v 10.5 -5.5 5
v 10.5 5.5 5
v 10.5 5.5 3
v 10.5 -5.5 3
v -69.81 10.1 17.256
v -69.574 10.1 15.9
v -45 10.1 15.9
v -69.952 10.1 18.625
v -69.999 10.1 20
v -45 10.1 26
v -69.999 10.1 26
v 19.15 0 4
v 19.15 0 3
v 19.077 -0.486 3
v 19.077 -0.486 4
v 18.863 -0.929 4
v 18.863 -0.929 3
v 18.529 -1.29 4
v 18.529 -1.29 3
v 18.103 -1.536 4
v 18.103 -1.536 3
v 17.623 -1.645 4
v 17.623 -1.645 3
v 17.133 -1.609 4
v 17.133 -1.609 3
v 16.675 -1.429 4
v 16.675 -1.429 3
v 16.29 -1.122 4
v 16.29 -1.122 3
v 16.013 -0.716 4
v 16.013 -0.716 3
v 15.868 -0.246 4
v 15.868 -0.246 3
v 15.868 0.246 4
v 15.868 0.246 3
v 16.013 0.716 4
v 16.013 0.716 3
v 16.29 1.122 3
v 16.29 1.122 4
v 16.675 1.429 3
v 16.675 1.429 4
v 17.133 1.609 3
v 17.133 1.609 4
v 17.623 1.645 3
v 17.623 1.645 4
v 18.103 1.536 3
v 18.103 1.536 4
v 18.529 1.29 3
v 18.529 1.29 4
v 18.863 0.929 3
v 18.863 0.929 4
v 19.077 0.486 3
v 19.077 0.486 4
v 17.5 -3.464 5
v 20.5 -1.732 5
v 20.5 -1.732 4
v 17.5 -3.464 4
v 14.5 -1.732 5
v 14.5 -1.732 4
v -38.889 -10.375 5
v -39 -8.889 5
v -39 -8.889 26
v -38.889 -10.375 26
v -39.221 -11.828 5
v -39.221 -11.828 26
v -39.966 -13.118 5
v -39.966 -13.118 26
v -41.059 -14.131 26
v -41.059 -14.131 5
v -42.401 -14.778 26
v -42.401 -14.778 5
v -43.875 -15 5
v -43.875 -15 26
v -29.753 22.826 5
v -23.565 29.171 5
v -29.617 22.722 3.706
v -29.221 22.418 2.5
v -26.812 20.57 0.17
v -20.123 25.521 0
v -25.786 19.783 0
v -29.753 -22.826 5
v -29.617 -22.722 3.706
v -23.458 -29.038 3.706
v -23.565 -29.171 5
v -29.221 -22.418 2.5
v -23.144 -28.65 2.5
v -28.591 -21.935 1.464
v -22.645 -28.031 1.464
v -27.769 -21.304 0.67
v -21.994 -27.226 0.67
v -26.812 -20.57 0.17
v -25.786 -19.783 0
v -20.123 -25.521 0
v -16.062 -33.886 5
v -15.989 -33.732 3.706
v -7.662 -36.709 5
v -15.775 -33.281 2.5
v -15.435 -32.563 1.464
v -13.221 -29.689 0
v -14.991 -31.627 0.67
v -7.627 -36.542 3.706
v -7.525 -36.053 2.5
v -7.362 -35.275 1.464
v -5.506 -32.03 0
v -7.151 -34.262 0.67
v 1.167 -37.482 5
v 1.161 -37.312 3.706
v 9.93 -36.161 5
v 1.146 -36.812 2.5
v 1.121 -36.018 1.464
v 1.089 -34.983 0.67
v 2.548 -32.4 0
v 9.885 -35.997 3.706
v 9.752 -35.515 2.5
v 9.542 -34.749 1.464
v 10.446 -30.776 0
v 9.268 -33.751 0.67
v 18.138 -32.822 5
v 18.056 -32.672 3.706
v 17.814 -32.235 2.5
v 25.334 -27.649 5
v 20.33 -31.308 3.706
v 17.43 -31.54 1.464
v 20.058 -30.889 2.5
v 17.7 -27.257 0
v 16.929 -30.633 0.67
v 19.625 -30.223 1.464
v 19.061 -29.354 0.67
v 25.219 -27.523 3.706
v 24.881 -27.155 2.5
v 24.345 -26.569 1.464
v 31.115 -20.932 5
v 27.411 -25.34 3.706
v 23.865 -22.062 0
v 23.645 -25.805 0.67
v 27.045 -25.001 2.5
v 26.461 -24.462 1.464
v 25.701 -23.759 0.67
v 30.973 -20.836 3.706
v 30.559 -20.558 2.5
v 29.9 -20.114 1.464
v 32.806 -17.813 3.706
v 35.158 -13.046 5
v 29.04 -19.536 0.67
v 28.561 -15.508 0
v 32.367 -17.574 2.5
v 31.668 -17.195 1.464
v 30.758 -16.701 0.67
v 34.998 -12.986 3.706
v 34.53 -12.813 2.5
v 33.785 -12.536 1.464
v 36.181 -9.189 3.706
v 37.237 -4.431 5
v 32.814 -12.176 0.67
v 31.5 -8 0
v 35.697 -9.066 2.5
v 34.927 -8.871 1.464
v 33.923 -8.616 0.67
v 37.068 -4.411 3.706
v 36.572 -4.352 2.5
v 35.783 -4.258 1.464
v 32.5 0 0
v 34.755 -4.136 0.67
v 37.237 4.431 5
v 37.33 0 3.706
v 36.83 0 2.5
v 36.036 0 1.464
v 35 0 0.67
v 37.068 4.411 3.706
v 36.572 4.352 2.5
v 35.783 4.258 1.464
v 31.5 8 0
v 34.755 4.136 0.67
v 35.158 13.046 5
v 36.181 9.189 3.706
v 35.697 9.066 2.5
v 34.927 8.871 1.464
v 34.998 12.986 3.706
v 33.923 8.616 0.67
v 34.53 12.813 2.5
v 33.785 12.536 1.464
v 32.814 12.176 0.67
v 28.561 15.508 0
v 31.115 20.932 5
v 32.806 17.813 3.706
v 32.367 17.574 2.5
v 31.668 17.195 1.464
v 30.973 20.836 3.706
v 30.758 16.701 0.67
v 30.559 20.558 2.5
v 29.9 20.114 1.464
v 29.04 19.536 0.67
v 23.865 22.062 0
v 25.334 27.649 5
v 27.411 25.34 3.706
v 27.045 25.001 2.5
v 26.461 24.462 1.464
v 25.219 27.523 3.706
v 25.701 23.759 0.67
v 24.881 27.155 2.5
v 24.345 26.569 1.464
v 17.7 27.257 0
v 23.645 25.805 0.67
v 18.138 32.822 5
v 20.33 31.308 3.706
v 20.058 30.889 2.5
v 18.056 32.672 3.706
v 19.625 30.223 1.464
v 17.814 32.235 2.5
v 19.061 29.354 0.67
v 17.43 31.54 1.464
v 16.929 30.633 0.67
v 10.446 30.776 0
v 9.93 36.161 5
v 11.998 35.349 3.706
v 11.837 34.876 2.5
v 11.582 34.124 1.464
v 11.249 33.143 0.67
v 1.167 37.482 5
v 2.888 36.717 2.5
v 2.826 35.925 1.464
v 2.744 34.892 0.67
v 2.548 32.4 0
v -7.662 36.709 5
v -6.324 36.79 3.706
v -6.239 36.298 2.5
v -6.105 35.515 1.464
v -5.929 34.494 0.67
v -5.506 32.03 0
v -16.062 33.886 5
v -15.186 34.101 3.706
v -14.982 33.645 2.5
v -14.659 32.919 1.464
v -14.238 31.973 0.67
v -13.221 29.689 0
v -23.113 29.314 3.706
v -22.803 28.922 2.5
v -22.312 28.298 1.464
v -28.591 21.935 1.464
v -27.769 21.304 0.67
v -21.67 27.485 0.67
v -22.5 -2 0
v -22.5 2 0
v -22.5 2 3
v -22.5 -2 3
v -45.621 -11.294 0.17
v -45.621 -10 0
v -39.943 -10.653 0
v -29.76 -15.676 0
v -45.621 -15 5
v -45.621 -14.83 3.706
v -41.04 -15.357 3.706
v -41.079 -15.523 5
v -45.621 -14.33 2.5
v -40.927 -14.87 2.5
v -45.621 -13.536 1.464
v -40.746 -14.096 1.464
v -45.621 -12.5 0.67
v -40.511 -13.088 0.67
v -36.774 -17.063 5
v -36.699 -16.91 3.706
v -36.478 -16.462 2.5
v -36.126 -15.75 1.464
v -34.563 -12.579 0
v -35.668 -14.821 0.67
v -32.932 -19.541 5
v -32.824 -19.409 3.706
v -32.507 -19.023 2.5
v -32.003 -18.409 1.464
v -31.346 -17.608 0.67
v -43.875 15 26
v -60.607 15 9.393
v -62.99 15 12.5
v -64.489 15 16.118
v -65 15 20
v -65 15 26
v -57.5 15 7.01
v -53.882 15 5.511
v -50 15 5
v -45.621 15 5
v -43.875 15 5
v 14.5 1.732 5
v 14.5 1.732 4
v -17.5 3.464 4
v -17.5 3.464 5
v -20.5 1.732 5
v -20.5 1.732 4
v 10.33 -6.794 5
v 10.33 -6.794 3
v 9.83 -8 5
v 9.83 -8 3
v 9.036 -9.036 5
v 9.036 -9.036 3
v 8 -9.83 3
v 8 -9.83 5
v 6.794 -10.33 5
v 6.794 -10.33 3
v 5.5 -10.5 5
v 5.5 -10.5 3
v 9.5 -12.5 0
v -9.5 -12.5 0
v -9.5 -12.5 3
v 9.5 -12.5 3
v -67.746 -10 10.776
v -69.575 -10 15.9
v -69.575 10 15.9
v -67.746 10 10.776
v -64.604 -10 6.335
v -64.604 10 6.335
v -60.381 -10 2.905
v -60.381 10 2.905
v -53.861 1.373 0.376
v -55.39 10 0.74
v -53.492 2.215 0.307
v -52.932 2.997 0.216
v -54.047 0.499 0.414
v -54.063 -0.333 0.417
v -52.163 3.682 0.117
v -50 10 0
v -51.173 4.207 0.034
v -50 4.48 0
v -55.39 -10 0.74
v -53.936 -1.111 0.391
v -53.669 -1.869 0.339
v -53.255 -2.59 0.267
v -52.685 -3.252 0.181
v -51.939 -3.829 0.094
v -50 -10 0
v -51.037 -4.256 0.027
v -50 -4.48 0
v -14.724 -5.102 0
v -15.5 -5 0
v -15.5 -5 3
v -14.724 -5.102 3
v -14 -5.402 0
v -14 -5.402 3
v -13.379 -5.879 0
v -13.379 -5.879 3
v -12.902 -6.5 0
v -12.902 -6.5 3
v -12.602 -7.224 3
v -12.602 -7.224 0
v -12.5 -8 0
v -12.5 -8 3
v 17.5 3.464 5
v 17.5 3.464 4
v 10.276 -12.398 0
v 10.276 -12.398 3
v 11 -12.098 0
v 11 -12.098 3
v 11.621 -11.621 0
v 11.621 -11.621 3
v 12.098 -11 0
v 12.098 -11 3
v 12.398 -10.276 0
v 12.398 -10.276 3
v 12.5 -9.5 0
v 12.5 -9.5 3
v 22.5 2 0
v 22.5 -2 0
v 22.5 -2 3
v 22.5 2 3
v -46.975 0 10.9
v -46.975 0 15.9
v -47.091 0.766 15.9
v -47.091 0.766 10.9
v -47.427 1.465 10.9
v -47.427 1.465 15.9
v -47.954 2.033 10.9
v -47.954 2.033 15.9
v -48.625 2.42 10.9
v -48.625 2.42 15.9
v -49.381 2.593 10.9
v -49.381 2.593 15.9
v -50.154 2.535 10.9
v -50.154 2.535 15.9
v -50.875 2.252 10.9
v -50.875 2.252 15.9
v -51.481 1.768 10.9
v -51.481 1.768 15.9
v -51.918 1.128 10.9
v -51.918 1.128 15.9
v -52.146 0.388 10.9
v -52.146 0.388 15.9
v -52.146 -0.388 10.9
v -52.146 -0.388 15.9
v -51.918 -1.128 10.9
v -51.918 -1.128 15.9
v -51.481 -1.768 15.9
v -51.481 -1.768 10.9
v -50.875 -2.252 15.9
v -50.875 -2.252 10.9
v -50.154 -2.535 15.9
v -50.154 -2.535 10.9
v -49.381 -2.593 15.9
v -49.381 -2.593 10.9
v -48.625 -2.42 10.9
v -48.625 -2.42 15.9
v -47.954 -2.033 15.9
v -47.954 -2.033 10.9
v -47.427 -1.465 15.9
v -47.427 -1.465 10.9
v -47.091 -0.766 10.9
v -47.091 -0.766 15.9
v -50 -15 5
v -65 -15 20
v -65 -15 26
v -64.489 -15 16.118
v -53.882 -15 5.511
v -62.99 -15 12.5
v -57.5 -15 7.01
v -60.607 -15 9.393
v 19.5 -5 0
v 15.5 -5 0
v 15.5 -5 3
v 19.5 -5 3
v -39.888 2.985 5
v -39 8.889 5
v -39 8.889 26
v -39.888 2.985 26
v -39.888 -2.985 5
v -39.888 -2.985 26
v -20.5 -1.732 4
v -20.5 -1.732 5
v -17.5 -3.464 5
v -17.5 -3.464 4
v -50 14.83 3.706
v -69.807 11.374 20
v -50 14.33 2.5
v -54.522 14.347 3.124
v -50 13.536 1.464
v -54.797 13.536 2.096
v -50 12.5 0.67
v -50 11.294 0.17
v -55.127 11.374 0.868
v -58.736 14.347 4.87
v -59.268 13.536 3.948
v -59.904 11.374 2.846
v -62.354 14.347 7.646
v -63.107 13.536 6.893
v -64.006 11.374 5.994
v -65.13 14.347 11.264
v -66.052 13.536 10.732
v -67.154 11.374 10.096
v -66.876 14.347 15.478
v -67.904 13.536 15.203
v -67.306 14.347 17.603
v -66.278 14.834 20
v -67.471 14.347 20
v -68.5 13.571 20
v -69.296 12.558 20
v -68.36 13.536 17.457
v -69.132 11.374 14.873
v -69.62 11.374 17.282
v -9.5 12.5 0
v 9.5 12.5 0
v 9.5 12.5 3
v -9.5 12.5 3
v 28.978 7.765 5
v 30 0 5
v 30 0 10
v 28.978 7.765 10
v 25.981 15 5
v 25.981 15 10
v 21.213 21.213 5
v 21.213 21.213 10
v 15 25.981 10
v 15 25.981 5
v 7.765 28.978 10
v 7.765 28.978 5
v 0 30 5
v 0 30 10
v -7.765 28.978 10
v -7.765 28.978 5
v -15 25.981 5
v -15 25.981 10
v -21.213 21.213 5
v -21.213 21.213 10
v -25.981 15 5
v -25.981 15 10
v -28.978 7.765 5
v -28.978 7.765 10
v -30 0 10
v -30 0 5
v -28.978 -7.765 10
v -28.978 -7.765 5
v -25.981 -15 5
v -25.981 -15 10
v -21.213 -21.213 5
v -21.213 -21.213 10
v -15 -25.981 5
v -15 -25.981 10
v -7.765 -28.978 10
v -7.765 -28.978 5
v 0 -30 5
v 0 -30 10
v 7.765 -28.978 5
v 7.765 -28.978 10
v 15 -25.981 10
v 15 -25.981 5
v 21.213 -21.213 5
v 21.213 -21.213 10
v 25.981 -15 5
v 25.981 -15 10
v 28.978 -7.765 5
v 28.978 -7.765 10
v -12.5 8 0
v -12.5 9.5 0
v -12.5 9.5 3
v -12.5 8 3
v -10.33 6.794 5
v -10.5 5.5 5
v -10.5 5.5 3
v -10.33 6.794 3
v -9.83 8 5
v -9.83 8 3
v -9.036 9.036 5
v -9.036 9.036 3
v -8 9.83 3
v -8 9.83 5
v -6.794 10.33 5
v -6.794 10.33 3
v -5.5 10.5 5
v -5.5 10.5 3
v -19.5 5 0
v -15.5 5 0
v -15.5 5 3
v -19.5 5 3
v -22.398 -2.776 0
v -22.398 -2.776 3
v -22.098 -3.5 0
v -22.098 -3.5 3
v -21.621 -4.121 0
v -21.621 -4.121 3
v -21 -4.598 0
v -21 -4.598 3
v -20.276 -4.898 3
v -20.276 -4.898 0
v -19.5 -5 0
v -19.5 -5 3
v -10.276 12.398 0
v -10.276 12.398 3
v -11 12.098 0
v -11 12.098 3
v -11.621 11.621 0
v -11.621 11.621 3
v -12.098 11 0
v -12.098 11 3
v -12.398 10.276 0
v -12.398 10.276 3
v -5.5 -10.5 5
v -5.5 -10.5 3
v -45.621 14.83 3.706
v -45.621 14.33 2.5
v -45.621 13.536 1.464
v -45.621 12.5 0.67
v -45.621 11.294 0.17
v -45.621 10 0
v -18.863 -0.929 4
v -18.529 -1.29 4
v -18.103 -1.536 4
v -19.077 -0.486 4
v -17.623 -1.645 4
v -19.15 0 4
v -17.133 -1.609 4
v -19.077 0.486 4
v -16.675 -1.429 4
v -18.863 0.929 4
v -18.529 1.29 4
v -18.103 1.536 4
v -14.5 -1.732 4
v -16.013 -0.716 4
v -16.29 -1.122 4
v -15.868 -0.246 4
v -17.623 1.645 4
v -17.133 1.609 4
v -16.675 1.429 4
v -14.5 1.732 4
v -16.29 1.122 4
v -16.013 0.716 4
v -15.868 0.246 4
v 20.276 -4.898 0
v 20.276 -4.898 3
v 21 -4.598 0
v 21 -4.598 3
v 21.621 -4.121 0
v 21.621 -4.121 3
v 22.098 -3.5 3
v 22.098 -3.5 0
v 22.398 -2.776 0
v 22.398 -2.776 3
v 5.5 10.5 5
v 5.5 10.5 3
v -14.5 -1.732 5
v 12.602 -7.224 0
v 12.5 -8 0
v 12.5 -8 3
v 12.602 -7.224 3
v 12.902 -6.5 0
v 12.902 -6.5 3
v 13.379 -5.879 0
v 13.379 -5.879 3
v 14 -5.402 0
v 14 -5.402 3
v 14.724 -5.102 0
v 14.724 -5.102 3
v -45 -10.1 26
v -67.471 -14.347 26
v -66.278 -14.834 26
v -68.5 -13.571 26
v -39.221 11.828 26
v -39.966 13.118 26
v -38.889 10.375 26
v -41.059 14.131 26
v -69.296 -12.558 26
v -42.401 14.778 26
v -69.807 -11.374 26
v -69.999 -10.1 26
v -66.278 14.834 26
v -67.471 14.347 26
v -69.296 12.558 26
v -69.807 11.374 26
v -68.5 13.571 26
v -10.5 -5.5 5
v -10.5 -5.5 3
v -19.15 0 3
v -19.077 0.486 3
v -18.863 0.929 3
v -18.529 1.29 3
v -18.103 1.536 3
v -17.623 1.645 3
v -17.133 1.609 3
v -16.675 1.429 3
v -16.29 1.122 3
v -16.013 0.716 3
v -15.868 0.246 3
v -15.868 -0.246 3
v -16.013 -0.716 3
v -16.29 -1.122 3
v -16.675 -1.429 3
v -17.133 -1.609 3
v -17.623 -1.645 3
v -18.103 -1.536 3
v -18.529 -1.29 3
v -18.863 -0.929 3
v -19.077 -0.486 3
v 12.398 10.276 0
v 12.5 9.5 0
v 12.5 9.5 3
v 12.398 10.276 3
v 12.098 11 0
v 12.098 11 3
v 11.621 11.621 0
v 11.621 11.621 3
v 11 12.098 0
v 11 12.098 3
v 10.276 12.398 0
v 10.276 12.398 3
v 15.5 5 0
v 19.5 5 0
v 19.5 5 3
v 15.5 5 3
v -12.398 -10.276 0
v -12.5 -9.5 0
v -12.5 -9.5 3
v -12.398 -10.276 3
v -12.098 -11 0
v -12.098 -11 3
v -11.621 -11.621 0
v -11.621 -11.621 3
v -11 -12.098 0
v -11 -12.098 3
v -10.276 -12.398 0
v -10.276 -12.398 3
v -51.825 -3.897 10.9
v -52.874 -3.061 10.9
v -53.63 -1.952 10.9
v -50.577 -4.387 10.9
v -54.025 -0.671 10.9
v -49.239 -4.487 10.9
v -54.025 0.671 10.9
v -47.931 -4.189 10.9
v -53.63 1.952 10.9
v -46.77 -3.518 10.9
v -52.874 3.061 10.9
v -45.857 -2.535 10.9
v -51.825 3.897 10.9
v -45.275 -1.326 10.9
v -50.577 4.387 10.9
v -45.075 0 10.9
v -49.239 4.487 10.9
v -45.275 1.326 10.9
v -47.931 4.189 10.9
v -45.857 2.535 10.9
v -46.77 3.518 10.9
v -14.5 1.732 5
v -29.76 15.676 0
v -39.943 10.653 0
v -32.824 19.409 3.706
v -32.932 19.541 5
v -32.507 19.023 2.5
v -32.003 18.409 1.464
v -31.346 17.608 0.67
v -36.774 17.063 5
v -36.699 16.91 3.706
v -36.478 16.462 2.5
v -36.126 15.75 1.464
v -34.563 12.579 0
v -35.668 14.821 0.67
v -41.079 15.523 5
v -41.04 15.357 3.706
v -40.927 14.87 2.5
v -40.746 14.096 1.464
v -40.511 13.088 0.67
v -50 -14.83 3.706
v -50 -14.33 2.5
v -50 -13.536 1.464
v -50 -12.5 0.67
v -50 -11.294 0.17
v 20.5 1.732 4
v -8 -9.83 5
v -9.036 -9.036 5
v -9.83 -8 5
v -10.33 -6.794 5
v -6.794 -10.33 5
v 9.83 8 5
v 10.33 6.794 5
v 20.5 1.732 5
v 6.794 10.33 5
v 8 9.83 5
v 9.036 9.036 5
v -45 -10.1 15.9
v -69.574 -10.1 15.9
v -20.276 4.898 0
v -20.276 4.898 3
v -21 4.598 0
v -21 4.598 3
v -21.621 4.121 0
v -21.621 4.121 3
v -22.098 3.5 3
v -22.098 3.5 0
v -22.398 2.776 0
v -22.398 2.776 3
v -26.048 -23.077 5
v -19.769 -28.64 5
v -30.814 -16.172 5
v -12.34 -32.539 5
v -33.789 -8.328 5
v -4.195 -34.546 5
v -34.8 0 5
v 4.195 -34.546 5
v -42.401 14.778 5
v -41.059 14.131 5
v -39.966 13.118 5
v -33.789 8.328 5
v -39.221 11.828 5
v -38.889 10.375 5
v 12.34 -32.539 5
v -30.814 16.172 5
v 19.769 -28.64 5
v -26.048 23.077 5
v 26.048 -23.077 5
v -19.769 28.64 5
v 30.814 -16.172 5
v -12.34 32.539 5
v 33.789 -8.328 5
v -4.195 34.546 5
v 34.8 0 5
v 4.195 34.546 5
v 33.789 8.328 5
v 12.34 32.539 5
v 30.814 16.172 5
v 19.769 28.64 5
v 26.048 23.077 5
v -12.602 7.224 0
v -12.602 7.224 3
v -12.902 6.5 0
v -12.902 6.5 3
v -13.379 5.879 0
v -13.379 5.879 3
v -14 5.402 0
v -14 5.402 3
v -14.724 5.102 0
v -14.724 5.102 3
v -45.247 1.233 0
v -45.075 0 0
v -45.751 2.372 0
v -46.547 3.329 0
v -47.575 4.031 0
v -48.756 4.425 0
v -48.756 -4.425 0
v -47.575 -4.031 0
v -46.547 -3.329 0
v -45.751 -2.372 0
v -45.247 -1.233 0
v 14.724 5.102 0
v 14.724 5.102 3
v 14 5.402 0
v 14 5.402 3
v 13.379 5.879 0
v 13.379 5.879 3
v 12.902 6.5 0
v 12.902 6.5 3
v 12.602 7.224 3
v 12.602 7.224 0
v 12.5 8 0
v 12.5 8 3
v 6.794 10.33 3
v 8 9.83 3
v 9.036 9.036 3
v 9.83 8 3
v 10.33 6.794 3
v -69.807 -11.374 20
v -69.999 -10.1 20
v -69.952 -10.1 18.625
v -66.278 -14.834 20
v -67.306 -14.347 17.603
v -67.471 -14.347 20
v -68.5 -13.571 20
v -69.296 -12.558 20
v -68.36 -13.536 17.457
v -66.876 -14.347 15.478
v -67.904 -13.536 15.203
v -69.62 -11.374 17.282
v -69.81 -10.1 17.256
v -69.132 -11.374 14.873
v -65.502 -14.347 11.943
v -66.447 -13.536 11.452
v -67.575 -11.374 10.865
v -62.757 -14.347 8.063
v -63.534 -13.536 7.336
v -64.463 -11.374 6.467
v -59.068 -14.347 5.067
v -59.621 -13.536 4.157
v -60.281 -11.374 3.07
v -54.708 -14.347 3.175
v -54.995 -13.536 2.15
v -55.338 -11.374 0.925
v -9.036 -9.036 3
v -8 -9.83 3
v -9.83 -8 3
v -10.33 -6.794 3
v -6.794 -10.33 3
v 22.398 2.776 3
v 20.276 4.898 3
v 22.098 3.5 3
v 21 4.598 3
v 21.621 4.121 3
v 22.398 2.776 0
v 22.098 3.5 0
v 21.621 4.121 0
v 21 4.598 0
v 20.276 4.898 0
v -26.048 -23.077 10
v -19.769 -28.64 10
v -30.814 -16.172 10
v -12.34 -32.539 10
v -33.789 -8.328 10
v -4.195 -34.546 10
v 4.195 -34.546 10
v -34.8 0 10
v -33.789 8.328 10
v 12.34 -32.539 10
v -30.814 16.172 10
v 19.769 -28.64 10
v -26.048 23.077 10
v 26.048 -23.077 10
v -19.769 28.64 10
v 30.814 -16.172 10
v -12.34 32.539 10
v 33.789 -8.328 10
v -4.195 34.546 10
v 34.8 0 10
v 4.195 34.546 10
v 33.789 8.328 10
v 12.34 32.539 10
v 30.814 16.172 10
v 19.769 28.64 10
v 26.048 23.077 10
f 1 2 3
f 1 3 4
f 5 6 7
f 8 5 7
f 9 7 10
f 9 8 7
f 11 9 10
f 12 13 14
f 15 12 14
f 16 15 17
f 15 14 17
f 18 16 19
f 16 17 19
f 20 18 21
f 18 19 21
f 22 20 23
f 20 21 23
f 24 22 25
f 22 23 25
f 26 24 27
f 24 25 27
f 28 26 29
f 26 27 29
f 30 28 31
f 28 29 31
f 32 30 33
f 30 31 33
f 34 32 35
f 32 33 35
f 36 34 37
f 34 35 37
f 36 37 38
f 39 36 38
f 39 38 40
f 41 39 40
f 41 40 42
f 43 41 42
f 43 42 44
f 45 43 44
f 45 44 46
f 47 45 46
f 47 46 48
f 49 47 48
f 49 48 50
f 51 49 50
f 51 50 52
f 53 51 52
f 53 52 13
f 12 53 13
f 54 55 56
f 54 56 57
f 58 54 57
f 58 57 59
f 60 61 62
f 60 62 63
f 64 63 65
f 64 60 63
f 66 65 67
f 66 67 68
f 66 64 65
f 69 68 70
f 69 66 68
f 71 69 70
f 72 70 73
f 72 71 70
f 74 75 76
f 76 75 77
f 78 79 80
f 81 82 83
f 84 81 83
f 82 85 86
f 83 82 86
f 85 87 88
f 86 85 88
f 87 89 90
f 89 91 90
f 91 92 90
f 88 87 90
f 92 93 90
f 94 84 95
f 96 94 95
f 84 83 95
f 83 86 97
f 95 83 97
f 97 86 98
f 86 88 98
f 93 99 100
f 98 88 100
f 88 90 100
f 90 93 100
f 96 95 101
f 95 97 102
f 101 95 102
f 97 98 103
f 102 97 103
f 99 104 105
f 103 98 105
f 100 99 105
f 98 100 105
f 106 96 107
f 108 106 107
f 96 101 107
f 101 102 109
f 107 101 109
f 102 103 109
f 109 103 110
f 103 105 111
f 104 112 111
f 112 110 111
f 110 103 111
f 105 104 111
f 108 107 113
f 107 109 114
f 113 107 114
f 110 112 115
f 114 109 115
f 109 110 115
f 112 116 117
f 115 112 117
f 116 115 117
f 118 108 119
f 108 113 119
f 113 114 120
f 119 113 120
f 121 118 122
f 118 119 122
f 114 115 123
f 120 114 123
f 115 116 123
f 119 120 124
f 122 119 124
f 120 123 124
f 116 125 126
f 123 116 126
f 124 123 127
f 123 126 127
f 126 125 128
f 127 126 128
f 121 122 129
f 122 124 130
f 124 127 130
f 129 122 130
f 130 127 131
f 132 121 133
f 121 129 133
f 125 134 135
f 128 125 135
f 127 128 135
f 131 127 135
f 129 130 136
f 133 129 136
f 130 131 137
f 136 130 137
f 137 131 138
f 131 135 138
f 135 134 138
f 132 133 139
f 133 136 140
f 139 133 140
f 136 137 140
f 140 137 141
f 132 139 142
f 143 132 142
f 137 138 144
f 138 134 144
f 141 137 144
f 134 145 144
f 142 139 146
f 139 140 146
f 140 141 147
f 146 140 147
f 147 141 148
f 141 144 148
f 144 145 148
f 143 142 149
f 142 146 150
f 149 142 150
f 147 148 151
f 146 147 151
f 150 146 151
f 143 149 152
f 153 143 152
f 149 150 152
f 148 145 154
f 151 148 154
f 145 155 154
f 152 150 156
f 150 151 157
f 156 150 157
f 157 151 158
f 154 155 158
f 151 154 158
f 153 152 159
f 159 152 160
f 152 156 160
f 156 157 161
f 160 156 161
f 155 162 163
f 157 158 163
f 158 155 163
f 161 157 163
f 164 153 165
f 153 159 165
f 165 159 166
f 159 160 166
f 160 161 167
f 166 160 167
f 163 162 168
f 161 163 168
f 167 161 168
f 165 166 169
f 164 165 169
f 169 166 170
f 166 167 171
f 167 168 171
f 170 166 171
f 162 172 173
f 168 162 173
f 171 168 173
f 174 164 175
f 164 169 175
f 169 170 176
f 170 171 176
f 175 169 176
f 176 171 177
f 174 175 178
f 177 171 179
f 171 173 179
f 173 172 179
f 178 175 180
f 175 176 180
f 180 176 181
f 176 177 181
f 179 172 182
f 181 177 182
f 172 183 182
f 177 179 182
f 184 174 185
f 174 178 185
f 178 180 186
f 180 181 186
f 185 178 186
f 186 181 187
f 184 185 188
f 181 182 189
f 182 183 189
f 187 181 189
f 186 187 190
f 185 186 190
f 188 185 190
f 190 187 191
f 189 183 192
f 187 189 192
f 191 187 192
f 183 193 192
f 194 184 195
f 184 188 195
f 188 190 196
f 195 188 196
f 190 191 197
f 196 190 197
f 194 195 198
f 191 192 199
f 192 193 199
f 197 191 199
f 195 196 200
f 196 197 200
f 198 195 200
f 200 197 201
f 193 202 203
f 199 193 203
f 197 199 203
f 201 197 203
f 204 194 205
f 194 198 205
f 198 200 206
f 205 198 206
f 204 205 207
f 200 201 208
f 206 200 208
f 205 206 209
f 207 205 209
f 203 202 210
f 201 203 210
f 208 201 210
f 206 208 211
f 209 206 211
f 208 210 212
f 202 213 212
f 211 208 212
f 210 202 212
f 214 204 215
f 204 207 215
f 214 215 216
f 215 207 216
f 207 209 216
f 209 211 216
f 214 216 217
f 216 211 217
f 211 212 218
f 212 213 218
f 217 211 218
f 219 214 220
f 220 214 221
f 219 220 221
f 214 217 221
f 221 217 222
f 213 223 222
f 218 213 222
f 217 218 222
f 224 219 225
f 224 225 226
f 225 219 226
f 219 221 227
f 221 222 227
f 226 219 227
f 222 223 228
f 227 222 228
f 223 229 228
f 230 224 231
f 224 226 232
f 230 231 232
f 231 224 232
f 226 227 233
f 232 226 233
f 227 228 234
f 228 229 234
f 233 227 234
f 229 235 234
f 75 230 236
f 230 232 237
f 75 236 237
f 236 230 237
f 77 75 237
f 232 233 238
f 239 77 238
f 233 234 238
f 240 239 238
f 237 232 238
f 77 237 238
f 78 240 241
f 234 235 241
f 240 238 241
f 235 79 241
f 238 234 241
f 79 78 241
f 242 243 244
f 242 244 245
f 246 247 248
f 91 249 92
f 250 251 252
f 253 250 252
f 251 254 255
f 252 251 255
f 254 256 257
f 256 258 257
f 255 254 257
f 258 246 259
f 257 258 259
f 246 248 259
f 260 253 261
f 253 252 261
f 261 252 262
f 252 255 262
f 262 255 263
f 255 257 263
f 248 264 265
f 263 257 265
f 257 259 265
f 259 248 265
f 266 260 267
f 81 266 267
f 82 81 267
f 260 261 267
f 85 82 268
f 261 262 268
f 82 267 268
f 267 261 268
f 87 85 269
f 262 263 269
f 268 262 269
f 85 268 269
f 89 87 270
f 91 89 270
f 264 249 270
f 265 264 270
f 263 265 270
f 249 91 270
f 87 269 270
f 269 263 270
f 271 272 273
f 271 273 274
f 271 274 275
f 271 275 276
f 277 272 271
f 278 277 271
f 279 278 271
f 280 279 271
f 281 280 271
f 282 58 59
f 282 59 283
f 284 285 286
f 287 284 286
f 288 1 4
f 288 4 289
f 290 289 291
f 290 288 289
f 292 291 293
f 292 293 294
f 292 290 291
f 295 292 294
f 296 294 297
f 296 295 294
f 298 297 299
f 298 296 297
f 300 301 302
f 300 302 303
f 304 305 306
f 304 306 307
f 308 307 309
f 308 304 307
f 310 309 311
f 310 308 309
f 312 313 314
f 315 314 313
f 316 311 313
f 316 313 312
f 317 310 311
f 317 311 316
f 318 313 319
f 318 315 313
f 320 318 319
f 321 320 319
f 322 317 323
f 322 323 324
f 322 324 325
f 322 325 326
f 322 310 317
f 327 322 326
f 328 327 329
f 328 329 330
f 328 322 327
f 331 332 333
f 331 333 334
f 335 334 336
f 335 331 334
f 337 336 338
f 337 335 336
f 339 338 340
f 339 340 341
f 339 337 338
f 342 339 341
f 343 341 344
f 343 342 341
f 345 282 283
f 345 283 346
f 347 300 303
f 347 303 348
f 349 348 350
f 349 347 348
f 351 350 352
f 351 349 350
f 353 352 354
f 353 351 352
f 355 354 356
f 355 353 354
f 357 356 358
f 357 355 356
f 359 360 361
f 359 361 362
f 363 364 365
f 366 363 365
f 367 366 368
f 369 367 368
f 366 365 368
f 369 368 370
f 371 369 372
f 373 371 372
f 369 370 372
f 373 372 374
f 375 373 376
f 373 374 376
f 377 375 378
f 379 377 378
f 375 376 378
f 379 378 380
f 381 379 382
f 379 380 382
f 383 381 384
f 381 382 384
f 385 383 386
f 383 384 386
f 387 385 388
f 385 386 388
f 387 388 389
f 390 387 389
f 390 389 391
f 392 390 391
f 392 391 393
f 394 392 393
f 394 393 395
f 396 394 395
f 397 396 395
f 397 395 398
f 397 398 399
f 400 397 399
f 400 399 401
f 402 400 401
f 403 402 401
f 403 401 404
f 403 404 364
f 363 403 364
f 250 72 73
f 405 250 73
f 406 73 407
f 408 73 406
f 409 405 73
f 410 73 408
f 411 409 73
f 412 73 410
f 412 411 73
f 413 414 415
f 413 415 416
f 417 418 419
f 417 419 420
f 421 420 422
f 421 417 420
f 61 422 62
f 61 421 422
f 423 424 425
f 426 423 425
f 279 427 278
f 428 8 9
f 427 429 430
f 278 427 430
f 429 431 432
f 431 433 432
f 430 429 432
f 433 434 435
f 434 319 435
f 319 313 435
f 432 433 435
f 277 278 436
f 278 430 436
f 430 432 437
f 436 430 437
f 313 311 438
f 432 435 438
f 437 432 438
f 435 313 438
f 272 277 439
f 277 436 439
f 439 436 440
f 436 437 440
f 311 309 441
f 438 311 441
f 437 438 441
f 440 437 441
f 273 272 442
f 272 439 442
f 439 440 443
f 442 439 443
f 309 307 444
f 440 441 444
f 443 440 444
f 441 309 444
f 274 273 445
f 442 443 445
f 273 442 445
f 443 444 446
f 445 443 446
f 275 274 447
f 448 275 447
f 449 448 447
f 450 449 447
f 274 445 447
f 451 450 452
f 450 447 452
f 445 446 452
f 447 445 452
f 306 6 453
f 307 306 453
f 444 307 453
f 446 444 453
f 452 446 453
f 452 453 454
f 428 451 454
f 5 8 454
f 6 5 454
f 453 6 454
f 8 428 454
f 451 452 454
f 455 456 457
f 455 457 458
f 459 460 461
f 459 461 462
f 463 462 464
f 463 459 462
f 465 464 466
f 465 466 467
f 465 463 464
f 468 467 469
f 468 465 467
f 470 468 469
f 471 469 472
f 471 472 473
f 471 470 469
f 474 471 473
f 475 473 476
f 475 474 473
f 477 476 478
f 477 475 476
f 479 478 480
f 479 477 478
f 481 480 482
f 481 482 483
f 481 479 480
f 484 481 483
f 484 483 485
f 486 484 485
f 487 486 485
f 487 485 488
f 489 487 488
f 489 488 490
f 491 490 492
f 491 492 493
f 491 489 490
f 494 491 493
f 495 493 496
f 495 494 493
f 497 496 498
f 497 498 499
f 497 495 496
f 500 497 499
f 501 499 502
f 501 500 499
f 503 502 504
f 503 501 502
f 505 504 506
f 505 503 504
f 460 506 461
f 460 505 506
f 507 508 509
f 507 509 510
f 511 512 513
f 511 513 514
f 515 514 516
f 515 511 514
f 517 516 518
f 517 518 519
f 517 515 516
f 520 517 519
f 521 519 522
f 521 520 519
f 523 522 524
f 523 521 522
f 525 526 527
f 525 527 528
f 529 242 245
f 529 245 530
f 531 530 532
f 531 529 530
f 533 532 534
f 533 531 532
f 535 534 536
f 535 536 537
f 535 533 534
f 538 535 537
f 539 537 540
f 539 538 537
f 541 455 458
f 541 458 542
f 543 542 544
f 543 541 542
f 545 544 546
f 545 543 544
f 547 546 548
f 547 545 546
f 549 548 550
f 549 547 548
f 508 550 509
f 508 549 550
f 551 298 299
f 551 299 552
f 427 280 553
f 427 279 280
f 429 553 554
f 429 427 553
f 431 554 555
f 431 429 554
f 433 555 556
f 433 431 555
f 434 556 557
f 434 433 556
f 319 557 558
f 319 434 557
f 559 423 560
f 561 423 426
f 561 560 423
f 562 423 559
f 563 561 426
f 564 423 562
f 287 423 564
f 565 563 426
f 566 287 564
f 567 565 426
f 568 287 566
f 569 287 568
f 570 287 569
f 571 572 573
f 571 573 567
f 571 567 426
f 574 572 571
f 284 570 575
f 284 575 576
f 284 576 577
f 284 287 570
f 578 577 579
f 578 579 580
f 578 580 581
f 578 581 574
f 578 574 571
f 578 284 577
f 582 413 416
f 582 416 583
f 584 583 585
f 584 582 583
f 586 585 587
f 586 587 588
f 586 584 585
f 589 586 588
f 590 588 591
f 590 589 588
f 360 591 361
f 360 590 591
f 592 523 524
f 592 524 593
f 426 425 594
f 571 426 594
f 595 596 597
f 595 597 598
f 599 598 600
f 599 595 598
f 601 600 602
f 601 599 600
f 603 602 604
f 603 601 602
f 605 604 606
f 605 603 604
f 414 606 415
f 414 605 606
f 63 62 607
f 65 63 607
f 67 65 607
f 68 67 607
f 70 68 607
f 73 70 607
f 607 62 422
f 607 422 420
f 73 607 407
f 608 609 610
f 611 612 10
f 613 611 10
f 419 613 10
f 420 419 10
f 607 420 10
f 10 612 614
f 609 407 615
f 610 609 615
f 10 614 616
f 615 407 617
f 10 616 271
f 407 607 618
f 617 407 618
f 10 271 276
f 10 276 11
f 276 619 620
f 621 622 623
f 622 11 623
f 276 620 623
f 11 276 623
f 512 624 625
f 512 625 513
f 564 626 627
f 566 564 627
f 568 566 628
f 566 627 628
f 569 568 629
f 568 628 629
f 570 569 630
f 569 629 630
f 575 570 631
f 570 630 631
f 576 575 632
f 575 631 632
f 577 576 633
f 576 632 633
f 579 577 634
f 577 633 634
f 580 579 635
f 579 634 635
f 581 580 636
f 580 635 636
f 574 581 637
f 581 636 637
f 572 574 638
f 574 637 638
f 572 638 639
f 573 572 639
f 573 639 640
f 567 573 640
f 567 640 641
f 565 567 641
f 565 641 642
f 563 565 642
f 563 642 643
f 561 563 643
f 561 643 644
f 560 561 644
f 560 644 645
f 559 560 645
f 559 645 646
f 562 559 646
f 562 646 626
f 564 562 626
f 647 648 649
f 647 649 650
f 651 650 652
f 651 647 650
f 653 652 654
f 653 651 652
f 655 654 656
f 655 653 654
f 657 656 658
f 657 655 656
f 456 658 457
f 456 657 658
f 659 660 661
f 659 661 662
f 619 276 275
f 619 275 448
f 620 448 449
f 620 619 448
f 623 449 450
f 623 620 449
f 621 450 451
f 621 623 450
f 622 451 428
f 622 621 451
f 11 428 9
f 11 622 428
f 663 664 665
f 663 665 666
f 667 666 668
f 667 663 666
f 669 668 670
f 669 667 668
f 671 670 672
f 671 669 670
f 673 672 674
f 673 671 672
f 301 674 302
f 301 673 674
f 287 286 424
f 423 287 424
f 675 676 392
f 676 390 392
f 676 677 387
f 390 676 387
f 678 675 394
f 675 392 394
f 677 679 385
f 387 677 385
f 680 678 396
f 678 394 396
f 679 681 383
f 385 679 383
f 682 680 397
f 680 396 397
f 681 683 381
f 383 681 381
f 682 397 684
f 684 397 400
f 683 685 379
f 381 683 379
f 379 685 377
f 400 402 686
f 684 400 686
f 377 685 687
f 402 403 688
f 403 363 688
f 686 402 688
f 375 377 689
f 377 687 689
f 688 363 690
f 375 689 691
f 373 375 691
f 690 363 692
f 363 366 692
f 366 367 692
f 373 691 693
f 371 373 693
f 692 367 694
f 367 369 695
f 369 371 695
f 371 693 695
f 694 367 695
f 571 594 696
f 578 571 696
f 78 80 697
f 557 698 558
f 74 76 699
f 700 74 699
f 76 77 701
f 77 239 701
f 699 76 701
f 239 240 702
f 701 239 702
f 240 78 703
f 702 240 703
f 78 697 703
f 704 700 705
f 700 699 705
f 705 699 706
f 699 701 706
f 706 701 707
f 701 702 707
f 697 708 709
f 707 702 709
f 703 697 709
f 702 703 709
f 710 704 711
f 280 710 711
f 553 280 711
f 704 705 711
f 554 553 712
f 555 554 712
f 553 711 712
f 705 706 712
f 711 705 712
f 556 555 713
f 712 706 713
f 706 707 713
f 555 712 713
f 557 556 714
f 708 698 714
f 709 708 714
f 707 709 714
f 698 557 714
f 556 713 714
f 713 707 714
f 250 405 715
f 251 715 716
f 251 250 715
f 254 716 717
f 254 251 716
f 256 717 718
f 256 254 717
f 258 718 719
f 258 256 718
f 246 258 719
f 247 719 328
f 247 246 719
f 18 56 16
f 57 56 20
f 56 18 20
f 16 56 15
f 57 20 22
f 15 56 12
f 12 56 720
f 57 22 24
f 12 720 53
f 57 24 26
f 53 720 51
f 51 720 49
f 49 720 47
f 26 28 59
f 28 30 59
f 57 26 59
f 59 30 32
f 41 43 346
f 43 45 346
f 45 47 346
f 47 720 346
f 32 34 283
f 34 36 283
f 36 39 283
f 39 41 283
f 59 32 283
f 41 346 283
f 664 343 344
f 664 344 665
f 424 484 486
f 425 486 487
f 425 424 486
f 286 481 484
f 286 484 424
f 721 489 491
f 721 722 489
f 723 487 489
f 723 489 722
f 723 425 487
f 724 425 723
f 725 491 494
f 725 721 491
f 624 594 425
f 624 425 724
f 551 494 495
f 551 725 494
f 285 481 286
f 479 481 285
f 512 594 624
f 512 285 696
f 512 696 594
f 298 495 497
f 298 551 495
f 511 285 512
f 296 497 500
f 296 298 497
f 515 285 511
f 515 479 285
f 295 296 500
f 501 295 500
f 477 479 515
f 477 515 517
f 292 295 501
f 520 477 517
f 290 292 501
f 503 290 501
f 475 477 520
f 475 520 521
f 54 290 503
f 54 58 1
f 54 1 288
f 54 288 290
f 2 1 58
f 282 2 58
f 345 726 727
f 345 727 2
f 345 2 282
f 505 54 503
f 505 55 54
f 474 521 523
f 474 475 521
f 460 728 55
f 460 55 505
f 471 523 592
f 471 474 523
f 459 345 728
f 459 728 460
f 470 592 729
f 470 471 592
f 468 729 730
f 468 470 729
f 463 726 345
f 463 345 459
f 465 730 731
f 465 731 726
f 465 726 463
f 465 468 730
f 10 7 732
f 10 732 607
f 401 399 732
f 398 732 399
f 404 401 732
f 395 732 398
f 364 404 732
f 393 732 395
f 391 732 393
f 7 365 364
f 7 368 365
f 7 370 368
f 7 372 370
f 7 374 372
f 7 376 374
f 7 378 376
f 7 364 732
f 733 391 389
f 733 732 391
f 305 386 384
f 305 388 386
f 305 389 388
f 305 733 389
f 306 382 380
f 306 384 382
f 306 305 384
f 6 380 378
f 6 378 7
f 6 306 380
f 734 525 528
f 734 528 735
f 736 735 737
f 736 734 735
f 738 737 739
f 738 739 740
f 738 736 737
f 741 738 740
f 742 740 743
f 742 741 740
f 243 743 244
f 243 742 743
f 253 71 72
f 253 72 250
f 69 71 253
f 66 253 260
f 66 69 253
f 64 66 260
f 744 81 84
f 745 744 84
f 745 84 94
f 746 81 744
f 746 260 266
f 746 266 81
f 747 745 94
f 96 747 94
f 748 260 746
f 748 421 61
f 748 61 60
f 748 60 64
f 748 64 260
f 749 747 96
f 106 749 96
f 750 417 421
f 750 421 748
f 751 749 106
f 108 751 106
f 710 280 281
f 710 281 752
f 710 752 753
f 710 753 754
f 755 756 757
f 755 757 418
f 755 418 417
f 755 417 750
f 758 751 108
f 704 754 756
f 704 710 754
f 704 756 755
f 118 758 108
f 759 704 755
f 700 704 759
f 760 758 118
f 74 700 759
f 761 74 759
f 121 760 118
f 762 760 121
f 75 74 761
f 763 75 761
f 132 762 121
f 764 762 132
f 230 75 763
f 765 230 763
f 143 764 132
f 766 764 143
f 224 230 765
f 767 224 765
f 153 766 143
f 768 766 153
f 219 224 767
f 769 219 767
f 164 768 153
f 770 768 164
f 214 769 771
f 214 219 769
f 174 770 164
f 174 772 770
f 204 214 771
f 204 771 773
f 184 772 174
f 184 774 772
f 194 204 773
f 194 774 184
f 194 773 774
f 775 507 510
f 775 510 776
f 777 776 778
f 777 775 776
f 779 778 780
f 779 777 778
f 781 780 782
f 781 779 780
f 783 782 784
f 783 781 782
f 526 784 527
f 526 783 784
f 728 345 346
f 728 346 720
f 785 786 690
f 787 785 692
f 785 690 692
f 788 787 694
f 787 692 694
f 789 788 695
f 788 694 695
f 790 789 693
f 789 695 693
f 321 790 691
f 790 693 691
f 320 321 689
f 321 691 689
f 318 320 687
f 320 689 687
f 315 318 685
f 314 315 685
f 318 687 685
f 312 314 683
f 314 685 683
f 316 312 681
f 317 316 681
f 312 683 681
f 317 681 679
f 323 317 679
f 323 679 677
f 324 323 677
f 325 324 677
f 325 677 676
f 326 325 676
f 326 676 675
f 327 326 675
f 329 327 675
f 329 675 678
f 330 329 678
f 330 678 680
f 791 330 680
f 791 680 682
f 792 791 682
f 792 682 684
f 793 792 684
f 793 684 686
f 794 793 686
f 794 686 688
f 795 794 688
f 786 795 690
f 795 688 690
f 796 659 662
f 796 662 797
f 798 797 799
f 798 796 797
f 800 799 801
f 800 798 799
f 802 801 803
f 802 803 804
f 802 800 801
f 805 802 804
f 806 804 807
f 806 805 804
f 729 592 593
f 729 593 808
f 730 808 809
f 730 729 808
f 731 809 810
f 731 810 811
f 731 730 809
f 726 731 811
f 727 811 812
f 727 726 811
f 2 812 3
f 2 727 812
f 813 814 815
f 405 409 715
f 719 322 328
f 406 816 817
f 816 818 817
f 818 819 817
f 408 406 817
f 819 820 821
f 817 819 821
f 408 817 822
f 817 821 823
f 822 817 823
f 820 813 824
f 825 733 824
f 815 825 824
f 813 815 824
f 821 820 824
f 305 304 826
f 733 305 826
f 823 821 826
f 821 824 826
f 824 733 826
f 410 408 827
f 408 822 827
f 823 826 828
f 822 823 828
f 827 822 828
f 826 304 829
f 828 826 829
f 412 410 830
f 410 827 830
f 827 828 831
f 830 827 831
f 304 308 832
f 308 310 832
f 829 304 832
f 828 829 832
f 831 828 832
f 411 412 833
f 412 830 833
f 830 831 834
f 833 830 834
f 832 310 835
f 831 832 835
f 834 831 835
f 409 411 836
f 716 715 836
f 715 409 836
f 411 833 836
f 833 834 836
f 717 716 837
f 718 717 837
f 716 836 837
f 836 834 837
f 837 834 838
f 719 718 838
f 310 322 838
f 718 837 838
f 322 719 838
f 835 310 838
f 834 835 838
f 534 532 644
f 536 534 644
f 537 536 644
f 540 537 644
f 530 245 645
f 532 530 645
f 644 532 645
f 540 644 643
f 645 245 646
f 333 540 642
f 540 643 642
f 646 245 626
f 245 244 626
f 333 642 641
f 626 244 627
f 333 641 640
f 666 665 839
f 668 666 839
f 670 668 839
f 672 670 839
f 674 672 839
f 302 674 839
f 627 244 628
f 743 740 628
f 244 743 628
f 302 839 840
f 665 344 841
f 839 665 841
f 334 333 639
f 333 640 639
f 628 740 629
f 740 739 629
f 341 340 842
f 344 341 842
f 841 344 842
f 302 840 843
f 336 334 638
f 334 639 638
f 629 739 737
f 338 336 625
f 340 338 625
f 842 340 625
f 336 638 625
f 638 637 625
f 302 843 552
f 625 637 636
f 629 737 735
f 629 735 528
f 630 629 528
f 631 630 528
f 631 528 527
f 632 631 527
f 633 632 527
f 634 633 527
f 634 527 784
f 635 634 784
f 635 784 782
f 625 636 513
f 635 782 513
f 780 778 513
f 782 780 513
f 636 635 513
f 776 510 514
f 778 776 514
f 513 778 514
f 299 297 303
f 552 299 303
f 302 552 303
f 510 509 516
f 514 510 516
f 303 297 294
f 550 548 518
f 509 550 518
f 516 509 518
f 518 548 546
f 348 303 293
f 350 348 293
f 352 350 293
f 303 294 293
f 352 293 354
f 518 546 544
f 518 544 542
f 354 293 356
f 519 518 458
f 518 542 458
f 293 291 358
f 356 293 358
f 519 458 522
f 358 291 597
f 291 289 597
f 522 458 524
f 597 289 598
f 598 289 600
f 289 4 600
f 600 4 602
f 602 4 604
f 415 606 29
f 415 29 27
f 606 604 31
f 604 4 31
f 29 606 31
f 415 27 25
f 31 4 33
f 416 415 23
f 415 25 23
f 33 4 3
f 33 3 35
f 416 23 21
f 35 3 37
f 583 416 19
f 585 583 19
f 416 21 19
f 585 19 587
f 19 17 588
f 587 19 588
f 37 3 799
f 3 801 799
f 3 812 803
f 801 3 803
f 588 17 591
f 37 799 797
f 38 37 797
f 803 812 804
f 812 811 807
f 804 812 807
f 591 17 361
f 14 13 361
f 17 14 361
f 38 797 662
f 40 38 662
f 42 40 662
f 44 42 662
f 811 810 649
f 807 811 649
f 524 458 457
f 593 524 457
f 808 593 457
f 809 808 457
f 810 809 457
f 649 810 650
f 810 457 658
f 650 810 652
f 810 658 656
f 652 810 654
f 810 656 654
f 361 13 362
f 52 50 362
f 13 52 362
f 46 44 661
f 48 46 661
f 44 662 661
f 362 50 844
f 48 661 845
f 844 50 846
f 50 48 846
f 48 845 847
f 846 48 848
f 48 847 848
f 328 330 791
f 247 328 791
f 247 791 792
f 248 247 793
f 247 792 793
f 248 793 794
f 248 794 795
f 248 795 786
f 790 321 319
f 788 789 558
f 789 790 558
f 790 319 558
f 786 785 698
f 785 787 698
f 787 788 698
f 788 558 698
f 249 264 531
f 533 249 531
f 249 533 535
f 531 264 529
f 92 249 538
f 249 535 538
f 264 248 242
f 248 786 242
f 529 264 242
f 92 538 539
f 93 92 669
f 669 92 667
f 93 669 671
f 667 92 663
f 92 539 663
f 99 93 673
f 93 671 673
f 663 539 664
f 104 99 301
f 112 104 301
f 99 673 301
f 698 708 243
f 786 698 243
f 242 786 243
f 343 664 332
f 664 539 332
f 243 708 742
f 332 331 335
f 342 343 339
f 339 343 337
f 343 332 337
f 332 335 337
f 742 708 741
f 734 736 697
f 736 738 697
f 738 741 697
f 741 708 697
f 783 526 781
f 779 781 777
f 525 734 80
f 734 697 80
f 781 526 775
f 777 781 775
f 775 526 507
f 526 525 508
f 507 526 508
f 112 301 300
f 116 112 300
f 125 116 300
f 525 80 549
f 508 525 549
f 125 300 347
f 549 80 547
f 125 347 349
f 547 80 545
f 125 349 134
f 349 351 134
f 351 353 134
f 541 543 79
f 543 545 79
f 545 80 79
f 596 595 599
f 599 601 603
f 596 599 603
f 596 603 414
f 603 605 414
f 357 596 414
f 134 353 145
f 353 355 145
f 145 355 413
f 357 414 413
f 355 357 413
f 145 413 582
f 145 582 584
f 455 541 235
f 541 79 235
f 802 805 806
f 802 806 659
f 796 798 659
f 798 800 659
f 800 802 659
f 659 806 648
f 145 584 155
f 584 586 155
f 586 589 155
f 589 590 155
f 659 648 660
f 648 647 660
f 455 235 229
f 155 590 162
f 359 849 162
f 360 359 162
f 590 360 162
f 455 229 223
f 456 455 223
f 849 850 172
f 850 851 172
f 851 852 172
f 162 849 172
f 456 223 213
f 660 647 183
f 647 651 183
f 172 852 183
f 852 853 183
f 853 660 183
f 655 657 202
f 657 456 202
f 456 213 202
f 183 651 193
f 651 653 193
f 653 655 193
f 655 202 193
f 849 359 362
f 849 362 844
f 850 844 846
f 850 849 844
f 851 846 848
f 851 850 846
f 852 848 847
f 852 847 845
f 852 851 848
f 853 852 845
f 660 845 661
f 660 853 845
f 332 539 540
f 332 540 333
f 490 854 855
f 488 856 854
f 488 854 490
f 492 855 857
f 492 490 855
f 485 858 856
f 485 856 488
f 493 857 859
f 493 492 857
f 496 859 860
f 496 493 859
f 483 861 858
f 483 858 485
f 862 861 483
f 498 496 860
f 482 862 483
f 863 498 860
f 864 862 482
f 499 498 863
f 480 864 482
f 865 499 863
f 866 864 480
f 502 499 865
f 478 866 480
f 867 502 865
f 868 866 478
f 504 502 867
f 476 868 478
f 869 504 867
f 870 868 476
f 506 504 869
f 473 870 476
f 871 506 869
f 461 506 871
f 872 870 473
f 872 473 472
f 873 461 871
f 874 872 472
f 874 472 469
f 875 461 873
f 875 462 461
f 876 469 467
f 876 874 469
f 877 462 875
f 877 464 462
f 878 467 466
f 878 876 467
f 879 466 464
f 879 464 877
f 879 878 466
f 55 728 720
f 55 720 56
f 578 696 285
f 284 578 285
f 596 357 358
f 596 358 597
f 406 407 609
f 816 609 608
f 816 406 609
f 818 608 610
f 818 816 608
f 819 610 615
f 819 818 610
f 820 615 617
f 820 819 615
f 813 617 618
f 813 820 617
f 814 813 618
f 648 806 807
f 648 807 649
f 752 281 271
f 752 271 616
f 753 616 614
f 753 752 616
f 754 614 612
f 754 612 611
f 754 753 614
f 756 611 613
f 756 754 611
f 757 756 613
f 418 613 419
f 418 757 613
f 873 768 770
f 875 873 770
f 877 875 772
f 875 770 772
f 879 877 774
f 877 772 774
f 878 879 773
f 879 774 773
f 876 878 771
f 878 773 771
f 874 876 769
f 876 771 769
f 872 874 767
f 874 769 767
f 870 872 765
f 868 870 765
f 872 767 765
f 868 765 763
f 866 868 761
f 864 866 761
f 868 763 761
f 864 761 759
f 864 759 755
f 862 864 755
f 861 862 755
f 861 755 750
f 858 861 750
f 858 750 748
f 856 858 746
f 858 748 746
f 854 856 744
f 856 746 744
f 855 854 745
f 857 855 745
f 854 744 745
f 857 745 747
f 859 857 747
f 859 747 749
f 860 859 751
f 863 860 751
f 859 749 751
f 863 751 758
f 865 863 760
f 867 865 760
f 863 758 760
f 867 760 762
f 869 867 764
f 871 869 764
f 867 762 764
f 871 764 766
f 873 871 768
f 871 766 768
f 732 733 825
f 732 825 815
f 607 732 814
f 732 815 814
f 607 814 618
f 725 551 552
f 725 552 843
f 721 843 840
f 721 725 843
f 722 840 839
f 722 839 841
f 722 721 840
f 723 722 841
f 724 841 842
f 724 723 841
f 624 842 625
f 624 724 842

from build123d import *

# Parameters (mm, degrees)
BOSS_EXTRU_1_DEPTH      = 5
ESQUISSE6_R             = 34.8
ESQUISSE6_R_2           = 30
BOSS_EXTRU_6_DEPTH      = 5
BOSS_EXTRU_9_DEPTH      = 21
CONG_1_R                = 20
CONG_2_R                = 5
ESQUISSE11_W            = 20.2
ESQUISSE11_H            = 20.2
ENL_V_MAT_EXTRU_2_DEPTH = 25
ESQUISSE12_R            = 2.6
ENL_V_MAT_EXTRU_3_DEPTH = 81.987161213
ENL_V_START             = -5
ESQUISSE13_R            = 4.5
ENL_V_MAT_EXTRU_4_DEPTH = 76.987161213
ENL_V_MAT_EXTRU_5_DEPTH = 2
ENL_V_MAT_EXTRU_7_DEPTH = 3
ESQUISSE19_R            = 1.65
ENL_V_MAT_EXTRU_8_DEPTH = 83.674725752
ENL_V_MAT_EXTRU_9_DEPTH = 1


with BuildPart() as part:
    # Esquisse1 → Boss.-Extru.1 (new body)
    with BuildSketch(Plane.XY):
        with BuildLine():
            Line((-45.620718977, 15), (-70, 15))
            Line((-70, 15), (-70, -15))
            Line((-70, -15), (-45.620718977, -15))
            ThreePointArc((-45.620718977, -15), (-36.774201608, -17.062911874), (-29.752642811, -22.826086957))
            ThreePointArc((-29.752642811, -22.826086957), (37.5, 0), (-29.752642811, 22.826086957))
            ThreePointArc((-29.752642811, 22.826086957), (-36.774201608, 17.062911874), (-45.620718977, 15))
        make_face()
    extrude(amount=BOSS_EXTRU_1_DEPTH)

    # Esquisse6 → Boss.-Extru.6 (add)
    with BuildSketch(Plane.XY.offset(5)):
        Circle(ESQUISSE6_R)
        Circle(ESQUISSE6_R_2, mode=Mode.SUBTRACT)
    extrude(amount=BOSS_EXTRU_6_DEPTH)

    # Esquisse8 → Boss.-Extru.9 (add)
    with BuildSketch(Plane.XY.offset(5)):
        with BuildLine():
            Line((-70, -15), (-70, 15))
            Line((-70, 15), (-43.874821937, 15))
            ThreePointArc((-43.874821937, 15), (-39.966142137, 13.118047822), (-38.999841722, 8.888888889))
            ThreePointArc((-38.999841722, 8.888888889), (-40, 0), (-38.999841722, -8.888888889))
            ThreePointArc((-38.999841722, -8.888888889), (-39.966142137, -13.118047822), (-43.874821937, -15))
            Line((-43.874821937, -15), (-70, -15))
        make_face()
    extrude(amount=BOSS_EXTRU_9_DEPTH)

    # Congé1
    cong_1_edges = [part.edges().sort_by_distance(p)[0] for p in [
        (-70, 0, 0),
    ]]
    fillet(cong_1_edges, radius=CONG_1_R)

    # Congé2
    cong_2_edges = [part.edges().sort_by_distance(p)[0] for p in [
        (-47.810359489, -15, 0),
        (-36.774201608, -17.062911874, 0),
        (37.5, 0, 0),
        (-36.774201608, 17.062911874, 0),
        (-47.810359489, 15, 0),
        (-64.142135624, 15, 5.857864376),
        (-64.142135624, -15, 5.857864376),
        (-70, -15, 23),
        (-70, 15, 23),
    ]]
    fillet(cong_2_edges, radius=CONG_2_R - 0.0001)  # a hair under: the kernel refuses the full size

    # Esquisse11 → Enlèv. mat.-Extru.2 (cut)
    with BuildSketch(Plane.ZY.offset(70)):
        with Locations((26, 0)):
            Rectangle(ESQUISSE11_W, ESQUISSE11_H)
    extrude(amount=-ENL_V_MAT_EXTRU_2_DEPTH, mode=Mode.SUBTRACT)

    # Esquisse12 → Enlèv. mat.-Extru.3 (cut, through all)
    with BuildSketch(Plane.XY.offset(15.9)):
        with Locations((-49.575239462, 0)):
            Circle(ESQUISSE12_R)
    extrude(amount=-ENL_V_MAT_EXTRU_3_DEPTH, mode=Mode.SUBTRACT)

    # Esquisse13 → Enlèv. mat.-Extru.4 (cut, through all)
    with BuildSketch(Plane.XY.offset(15.9).offset(ENL_V_START)):
        with Locations((-49.575239462, 0)):
            Circle(ESQUISSE13_R)
    extrude(amount=-ENL_V_MAT_EXTRU_4_DEPTH, mode=Mode.SUBTRACT)

    # Esquisse14 → Enlèv. mat.-Extru.5 (cut)
    with BuildSketch(Plane.XY.offset(5)):
        with BuildLine():
            Line((-5.5, 10.5), (5.5, 10.5))
            ThreePointArc((5.5, 10.5), (9.035533906, 9.035533906), (10.5, 5.5))
            Line((10.5, 5.5), (10.5, -5.5))
            ThreePointArc((10.5, -5.5), (9.035533906, -9.035533906), (5.5, -10.5))
            Line((5.5, -10.5), (-5.5, -10.5))
            ThreePointArc((-5.5, -10.5), (-9.035533906, -9.035533906), (-10.5, -5.5))
            Line((-10.5, -5.5), (-10.5, 5.5))
            ThreePointArc((-10.5, 5.5), (-9.035533906, 9.035533906), (-5.5, 10.5))
        make_face()
    extrude(amount=-ENL_V_MAT_EXTRU_5_DEPTH, mode=Mode.SUBTRACT)

    # Esquisse17 → Enlèv. mat.-Extru.7 (cut)
    with BuildSketch(Plane(origin=(0, 0, 0), x_dir=(-1, 0, 0), z_dir=(0, 0, -1))):
        with BuildLine():
            Line((15.5, 5), (19.5, 5))
            ThreePointArc((19.5, 5), (21.621320344, 4.121320344), (22.5, 2))
            Line((22.5, 2), (22.5, -2))
            ThreePointArc((22.5, -2), (21.621320344, -4.121320344), (19.5, -5))
            Line((19.5, -5), (15.5, -5))
            ThreePointArc((15.5, -5), (13.378679656, -5.878679656), (12.5, -8))
            Line((12.5, -8), (12.5, -9.5))
            ThreePointArc((12.5, -9.5), (11.621320344, -11.621320344), (9.5, -12.5))
            Line((9.5, -12.5), (-9.5, -12.5))
            ThreePointArc((-9.5, -12.5), (-11.621320344, -11.621320344), (-12.5, -9.5))
            Line((-12.5, -9.5), (-12.5, -8))
            ThreePointArc((-12.5, -8), (-13.378679656, -5.878679656), (-15.5, -5))
            Line((-15.5, -5), (-19.5, -5))
            ThreePointArc((-19.5, -5), (-21.621320344, -4.121320344), (-22.5, -2))
            Line((-22.5, -2), (-22.5, 2))
            ThreePointArc((-22.5, 2), (-21.621320344, 4.121320344), (-19.5, 5))
            Line((-19.5, 5), (-15.5, 5))
            ThreePointArc((-15.5, 5), (-13.378679656, 5.878679656), (-12.5, 8))
            Line((-12.5, 8), (-12.5, 9.5))
            ThreePointArc((-12.5, 9.5), (-11.621320344, 11.621320344), (-9.5, 12.5))
            Line((-9.5, 12.5), (9.5, 12.5))
            ThreePointArc((9.5, 12.5), (11.621320344, 11.621320344), (12.5, 9.5))
            Line((12.5, 9.5), (12.5, 8))
            ThreePointArc((12.5, 8), (13.378679656, 5.878679656), (15.5, 5))
        make_face()
    extrude(amount=-ENL_V_MAT_EXTRU_7_DEPTH, mode=Mode.SUBTRACT)

    # Esquisse19 → Enlèv. mat.-Extru.8 (cut, through all)
    with BuildSketch(Plane(origin=(0, 0, 3), x_dir=(-1, 0, 0), z_dir=(0, 0, -1))):
        with Locations((17.5, 0)):
            Circle(ESQUISSE19_R)
        with Locations(Location((-17.5, 0, 0), (0, 0, 180))):
            Circle(ESQUISSE19_R)
    extrude(amount=-ENL_V_MAT_EXTRU_8_DEPTH, mode=Mode.SUBTRACT)

    # Esquisse20 → Enlèv. mat.-Extru.9 (cut)
    with BuildSketch(Plane.XY.offset(5)):
        Polygon((-17.5, -3.464101615), (-14.5, -1.732050808), (-14.5, 1.732050808), (-17.5, 3.464101615), (-20.5, 1.732050808), (-20.5, -1.732050808), align=None)
        Polygon((20.5, -1.732050808), (17.5, -3.464101615), (14.5, -1.732050808), (14.5, 1.732050808), (17.5, 3.464101615), (20.5, 1.732050808), align=None)
    extrude(amount=-ENL_V_MAT_EXTRU_9_DEPTH, mode=Mode.SUBTRACT)


solid = part.part
